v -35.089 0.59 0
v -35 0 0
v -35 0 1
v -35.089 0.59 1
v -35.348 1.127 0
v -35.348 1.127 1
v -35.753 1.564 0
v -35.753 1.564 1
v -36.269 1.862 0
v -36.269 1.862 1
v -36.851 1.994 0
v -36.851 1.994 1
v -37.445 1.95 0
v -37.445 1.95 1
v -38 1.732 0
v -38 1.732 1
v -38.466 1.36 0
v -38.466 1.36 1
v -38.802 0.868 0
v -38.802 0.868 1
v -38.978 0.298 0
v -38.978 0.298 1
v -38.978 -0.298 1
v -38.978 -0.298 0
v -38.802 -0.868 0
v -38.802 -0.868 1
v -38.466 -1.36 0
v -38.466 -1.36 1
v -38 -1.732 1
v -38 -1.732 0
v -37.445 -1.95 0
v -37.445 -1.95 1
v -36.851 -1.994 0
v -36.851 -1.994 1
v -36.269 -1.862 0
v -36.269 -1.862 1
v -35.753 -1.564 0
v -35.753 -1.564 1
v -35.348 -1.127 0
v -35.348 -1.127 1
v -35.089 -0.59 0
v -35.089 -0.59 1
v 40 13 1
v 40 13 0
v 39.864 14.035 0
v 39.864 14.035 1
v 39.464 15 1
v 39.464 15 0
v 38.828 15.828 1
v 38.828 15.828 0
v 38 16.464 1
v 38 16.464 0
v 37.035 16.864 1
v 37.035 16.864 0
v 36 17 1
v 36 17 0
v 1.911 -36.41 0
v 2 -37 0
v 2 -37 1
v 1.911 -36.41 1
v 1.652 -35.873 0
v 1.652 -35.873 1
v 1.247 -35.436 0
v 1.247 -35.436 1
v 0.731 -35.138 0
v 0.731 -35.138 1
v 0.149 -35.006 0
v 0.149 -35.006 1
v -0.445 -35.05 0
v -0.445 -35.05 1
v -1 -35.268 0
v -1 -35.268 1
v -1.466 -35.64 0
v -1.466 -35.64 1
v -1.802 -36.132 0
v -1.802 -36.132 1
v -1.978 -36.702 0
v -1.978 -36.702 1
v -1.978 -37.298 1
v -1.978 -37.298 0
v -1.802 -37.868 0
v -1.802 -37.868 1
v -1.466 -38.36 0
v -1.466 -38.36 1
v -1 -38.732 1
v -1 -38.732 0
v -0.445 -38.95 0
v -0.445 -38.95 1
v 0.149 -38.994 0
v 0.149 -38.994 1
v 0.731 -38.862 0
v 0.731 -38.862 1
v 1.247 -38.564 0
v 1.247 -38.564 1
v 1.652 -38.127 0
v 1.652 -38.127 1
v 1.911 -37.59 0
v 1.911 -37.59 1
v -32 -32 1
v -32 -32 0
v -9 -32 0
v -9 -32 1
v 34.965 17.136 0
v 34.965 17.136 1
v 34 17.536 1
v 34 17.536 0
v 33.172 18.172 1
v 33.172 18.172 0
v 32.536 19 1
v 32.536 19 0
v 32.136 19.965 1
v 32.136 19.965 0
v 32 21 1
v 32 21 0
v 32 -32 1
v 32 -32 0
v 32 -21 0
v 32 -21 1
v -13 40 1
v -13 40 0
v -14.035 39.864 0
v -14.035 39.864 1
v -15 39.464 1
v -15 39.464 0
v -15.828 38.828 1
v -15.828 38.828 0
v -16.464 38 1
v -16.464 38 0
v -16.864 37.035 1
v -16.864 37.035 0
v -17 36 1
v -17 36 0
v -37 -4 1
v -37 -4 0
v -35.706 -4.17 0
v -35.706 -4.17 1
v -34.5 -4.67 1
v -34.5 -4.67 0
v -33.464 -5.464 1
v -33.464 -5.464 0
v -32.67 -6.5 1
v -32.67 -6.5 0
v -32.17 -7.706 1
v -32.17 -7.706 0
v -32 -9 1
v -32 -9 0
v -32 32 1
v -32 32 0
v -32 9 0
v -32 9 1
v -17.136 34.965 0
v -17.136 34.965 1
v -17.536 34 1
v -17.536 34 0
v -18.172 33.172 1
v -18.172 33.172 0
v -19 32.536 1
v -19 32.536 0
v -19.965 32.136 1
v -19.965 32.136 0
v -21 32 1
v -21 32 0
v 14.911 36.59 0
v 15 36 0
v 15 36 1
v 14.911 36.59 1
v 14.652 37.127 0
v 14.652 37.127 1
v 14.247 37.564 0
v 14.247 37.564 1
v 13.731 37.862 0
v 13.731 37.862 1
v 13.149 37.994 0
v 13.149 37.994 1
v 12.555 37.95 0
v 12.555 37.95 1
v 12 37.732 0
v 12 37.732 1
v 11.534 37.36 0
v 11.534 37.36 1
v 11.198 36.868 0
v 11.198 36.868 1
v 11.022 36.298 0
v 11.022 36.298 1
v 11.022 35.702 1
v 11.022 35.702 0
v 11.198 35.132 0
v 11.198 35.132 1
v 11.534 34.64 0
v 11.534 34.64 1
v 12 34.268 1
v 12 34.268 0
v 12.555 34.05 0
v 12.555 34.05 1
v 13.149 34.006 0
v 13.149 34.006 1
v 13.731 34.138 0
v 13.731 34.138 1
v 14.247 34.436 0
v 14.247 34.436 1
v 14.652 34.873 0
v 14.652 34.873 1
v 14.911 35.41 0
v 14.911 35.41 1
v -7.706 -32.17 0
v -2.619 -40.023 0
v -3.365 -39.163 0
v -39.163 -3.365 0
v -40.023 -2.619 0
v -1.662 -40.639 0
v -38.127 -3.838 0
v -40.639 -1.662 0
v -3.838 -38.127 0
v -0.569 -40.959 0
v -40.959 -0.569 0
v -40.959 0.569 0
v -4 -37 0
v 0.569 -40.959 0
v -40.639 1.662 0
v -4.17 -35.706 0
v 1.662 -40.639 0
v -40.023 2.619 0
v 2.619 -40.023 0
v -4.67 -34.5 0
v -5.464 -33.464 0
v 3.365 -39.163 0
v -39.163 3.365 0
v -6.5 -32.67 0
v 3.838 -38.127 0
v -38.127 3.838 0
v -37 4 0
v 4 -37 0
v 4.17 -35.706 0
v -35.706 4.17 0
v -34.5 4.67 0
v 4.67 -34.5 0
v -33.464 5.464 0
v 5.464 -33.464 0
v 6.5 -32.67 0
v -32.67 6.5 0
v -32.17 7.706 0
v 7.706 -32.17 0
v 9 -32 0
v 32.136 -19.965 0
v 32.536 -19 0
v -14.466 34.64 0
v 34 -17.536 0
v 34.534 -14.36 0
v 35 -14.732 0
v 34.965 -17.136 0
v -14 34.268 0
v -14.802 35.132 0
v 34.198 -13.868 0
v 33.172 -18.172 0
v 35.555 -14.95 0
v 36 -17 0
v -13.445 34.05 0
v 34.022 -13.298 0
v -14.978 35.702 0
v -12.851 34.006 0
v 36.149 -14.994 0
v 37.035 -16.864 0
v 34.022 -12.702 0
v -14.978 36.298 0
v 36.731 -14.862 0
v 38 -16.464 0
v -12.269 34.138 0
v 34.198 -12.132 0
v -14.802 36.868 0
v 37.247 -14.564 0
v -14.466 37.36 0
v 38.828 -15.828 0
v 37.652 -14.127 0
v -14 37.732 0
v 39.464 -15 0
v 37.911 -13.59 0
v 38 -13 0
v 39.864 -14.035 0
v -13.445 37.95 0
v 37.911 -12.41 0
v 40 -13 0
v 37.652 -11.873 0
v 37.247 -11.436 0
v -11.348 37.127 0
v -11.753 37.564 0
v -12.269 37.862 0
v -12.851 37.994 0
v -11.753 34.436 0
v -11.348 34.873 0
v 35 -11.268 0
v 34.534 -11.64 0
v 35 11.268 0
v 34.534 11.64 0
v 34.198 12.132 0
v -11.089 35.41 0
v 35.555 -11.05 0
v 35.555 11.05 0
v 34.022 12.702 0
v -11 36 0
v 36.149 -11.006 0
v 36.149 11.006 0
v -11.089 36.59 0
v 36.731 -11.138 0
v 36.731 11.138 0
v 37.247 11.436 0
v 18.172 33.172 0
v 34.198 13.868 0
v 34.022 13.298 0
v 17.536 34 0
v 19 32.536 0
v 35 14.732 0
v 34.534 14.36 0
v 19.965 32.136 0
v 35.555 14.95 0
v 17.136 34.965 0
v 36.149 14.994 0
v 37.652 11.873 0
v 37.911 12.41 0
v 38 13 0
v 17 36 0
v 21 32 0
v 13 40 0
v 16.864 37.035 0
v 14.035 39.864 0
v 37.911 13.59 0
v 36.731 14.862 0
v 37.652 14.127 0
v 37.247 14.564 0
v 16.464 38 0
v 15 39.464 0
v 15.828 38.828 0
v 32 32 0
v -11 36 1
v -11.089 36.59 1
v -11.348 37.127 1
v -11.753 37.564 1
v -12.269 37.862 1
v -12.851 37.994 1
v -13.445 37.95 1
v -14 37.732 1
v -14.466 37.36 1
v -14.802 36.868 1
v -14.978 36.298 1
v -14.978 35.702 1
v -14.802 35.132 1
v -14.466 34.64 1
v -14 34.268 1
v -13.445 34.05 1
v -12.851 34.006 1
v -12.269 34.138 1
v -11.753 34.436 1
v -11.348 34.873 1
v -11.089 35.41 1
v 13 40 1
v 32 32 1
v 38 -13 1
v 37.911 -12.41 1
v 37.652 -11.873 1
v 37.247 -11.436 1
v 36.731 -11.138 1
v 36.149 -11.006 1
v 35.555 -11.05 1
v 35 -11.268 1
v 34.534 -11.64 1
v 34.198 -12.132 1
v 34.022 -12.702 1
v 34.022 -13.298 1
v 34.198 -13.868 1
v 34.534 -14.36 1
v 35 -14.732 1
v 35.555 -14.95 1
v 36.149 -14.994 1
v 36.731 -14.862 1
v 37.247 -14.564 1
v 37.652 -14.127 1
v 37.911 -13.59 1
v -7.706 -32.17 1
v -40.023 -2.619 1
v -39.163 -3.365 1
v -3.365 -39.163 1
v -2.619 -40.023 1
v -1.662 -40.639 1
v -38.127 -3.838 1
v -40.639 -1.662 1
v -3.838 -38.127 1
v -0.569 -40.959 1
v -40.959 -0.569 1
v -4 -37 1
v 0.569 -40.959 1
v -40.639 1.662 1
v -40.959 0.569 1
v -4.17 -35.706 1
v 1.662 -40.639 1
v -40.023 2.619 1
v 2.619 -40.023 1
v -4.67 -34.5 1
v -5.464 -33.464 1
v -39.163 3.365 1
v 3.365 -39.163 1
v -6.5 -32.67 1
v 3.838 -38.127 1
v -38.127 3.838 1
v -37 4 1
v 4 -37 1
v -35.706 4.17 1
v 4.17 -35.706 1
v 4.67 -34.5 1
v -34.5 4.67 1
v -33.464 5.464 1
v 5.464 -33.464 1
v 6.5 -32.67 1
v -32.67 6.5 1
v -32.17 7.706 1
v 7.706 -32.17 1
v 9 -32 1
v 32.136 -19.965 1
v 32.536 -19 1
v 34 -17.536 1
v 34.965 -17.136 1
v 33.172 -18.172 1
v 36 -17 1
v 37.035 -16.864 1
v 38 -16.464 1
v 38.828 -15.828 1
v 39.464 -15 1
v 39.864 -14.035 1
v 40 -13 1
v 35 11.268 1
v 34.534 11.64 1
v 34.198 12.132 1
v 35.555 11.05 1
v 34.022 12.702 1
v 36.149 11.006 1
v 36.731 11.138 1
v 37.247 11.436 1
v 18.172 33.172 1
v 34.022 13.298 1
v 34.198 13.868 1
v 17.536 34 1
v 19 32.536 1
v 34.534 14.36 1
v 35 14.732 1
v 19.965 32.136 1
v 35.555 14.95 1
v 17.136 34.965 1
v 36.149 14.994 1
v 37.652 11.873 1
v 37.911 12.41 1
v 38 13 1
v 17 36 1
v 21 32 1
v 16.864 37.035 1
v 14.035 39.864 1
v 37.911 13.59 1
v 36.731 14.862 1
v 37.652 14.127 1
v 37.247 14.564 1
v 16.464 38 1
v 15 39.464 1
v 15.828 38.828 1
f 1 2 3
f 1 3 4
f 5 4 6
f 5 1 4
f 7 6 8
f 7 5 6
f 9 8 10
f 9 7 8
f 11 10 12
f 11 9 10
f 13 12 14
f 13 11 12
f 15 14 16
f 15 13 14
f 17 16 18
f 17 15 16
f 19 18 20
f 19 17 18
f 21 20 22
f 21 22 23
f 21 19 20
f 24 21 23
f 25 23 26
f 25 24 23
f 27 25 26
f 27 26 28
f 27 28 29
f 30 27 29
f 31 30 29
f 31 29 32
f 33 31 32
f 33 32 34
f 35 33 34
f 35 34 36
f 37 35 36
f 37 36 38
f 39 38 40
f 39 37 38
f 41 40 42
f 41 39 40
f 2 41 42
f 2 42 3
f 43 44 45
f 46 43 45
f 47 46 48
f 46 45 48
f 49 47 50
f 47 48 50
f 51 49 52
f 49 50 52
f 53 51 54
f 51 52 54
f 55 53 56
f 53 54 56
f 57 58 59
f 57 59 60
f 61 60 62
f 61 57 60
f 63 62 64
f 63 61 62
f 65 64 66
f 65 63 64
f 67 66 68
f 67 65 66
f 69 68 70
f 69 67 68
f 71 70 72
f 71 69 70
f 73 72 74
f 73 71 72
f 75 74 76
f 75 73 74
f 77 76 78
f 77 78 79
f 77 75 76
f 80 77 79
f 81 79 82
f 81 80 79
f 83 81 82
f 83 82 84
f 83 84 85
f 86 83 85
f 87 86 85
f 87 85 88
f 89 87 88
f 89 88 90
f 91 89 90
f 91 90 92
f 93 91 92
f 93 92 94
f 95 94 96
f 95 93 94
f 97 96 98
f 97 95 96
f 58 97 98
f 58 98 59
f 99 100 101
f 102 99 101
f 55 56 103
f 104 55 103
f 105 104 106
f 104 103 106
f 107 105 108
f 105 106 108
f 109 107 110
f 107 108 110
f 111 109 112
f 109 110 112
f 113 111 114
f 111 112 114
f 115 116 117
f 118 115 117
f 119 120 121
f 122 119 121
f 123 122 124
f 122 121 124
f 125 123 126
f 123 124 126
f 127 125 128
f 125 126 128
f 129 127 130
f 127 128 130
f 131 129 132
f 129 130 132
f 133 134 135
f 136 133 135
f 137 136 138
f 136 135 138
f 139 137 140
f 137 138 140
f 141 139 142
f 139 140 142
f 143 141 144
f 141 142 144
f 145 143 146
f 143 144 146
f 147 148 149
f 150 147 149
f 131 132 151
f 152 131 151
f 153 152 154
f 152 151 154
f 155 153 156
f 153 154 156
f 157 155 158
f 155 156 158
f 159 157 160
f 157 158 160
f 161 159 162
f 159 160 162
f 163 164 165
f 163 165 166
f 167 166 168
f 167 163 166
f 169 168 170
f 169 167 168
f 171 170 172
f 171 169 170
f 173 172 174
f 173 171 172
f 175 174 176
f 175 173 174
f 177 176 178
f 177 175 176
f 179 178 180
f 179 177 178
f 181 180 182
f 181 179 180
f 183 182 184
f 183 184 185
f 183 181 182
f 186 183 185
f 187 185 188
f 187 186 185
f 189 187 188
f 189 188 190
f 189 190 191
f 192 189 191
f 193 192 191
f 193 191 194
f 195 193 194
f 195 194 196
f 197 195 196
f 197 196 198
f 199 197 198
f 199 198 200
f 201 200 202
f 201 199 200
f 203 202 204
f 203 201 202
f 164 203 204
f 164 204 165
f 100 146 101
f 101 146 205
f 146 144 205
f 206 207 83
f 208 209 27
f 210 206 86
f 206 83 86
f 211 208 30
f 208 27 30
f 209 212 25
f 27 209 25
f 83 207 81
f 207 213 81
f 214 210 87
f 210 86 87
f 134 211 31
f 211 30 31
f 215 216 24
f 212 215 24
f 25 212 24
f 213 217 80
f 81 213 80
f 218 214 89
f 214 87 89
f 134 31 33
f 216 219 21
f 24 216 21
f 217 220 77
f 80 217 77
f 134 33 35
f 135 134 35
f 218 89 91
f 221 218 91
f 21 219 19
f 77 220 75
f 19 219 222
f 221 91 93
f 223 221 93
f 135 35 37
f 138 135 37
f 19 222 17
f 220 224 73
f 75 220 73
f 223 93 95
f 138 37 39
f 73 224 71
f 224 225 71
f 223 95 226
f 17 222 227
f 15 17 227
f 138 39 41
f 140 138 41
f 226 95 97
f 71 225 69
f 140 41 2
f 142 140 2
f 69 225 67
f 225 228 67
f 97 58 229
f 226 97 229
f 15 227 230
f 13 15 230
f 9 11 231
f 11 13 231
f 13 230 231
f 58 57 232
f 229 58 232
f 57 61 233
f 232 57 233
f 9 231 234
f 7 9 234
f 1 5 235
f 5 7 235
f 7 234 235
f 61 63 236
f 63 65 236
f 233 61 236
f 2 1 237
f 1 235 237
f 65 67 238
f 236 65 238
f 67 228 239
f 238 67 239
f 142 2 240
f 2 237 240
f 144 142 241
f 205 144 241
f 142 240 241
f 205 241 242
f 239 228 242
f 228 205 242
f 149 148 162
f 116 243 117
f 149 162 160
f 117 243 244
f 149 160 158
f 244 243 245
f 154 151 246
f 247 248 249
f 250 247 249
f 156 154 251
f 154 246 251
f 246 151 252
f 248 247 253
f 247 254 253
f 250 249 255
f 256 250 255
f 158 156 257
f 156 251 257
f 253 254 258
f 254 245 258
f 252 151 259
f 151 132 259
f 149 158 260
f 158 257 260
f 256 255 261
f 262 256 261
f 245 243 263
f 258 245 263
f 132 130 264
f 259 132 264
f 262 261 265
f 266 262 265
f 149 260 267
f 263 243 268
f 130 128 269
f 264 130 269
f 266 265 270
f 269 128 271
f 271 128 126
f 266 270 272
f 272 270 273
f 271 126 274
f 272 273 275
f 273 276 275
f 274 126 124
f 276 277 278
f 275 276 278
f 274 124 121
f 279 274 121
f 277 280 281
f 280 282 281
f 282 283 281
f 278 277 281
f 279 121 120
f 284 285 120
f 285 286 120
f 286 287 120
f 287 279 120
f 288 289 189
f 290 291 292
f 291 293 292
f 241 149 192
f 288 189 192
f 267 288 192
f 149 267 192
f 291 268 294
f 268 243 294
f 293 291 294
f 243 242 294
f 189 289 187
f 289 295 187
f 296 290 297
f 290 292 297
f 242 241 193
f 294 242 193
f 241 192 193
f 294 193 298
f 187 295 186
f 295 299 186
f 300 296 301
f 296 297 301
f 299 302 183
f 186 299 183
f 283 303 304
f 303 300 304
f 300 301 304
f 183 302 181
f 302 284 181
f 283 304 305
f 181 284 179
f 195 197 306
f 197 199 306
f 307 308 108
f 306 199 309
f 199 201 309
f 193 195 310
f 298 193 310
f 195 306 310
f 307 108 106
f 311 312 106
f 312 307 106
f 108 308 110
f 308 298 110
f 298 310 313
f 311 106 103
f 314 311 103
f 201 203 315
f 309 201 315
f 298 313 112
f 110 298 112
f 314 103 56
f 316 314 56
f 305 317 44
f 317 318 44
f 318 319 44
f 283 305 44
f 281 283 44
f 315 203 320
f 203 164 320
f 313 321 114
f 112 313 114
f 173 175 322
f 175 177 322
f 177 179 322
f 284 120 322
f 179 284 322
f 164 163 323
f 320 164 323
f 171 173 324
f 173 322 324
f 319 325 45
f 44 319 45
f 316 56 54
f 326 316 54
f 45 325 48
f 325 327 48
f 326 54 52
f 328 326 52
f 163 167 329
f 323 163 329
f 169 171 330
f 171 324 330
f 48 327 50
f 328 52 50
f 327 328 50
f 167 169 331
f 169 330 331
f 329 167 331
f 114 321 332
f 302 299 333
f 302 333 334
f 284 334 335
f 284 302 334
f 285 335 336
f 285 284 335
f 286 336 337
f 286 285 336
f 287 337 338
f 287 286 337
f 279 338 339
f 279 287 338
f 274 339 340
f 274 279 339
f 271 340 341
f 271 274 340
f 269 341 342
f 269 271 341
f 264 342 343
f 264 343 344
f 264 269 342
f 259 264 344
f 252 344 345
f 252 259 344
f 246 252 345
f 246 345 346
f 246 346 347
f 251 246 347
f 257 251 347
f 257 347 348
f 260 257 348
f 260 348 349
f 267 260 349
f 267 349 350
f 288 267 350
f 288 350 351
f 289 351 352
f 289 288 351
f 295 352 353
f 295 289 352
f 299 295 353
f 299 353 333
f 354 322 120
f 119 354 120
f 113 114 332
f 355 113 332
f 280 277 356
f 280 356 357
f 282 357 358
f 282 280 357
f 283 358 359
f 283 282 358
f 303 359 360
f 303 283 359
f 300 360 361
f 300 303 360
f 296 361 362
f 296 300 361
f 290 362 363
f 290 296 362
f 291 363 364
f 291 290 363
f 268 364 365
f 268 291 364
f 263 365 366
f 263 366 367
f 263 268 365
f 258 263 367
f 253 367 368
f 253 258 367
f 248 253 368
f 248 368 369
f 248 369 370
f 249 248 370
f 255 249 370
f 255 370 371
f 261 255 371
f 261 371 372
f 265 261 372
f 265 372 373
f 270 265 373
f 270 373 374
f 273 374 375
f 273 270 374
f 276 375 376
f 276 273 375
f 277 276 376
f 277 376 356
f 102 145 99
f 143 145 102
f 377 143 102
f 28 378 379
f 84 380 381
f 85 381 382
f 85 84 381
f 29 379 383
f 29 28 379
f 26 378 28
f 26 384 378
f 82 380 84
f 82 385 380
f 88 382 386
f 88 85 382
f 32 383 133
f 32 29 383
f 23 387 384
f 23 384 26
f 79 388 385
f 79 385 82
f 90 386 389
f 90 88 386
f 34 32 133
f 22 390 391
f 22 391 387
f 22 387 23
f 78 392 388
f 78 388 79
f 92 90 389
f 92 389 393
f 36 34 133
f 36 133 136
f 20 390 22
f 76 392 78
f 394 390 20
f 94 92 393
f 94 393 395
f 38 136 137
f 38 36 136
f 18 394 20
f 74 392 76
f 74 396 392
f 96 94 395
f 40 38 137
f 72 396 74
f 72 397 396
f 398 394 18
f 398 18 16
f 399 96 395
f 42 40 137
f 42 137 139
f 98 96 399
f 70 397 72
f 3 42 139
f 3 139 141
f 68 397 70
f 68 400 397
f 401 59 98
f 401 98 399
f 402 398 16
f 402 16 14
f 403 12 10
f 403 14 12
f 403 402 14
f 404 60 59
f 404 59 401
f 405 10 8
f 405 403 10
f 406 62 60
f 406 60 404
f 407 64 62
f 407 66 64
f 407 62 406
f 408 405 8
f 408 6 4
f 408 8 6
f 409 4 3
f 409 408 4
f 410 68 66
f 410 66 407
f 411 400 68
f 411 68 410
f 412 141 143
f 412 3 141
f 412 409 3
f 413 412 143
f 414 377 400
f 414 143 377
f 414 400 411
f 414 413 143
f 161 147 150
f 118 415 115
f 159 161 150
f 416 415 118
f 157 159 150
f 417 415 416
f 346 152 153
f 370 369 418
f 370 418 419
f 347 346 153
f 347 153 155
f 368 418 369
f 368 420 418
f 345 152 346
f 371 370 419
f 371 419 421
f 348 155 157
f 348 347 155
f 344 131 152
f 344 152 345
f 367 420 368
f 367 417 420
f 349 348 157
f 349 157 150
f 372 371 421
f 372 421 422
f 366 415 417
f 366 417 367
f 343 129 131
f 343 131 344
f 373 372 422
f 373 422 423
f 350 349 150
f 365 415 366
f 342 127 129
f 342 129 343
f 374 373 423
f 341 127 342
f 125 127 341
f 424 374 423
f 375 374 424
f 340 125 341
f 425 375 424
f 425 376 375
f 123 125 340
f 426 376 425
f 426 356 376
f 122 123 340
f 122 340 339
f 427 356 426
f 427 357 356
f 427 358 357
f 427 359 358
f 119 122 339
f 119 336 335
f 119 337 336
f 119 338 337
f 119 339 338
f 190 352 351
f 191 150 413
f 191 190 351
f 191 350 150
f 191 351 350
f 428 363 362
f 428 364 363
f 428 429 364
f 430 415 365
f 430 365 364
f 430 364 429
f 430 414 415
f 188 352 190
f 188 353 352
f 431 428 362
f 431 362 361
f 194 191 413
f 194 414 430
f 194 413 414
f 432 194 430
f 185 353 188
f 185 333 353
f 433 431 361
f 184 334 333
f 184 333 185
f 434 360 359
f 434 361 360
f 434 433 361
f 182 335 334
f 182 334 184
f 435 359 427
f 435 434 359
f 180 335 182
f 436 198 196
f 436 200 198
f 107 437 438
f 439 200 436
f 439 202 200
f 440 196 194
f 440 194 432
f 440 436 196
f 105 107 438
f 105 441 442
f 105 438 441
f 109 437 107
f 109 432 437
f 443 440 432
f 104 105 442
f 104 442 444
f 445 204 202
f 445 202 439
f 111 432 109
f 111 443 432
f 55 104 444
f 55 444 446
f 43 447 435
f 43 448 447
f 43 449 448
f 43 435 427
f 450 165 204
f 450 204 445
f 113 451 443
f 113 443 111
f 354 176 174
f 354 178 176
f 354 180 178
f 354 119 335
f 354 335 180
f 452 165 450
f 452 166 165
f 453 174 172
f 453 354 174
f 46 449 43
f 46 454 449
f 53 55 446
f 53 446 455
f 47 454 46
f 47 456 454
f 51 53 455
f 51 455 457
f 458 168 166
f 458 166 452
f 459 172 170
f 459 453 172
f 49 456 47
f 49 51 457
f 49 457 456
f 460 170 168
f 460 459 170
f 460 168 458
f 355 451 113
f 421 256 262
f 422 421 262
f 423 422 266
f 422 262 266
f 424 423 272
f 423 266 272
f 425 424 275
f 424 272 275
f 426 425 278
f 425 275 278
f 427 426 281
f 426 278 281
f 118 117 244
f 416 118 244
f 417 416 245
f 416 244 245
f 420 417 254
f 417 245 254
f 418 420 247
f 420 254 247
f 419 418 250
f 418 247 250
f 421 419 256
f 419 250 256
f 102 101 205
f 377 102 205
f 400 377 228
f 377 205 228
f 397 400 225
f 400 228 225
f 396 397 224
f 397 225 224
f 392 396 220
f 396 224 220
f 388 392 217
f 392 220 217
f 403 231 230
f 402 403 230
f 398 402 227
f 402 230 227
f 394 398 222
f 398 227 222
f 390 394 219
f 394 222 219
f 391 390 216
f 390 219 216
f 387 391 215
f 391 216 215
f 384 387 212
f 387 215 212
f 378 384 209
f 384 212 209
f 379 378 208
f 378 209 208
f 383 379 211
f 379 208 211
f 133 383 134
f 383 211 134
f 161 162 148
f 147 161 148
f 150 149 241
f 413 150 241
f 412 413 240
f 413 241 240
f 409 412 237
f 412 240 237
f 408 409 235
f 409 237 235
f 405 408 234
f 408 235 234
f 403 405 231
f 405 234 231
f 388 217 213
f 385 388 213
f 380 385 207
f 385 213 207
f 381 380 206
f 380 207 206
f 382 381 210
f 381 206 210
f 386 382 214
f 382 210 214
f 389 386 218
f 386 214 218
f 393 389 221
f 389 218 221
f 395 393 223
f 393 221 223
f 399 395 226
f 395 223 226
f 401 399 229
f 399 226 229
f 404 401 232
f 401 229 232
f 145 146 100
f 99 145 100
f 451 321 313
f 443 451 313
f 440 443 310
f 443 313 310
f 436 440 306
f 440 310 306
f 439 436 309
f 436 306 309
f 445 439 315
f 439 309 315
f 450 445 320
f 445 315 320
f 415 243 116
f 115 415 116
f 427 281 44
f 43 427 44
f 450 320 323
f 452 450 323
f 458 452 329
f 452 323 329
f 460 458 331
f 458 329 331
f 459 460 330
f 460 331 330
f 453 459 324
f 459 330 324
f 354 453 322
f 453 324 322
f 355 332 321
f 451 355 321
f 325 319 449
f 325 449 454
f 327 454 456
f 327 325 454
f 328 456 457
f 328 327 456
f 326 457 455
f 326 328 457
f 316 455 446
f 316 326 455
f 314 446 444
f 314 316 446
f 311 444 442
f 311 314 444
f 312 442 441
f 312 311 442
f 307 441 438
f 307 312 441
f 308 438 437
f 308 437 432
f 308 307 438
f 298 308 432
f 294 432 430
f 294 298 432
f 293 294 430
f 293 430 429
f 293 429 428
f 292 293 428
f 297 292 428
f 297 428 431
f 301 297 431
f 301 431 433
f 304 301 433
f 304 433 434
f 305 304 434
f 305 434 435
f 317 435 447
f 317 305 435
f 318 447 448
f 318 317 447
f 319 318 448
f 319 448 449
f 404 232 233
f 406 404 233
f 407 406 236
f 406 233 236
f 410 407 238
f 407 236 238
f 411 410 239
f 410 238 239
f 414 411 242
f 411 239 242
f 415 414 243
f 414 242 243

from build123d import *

# Parameters (mm, degrees)
SKETCH1_R           = 2
SKETCH1_W           = 56
SKETCH1_H           = 56
BOSS_EXTRUDE1_DEPTH = 1
SKETCH3_W           = 56
SKETCH3_H           = 56
BOSS_EXTRUDE3_DEPTH = 1


with BuildPart() as part:
    # Sketch1 → Boss-Extrude1 (new body)
    with BuildSketch(Plane.XY):
        with BuildLine():
            Line((40, -13), (40, 13))
            ThreePointArc((40, 13), (38.828427125, 15.828427125), (36, 17))
            ThreePointArc((36, 17), (33.171572875, 18.171572875), (32, 21))
            Line((32, 21), (32, 32))
            Line((32, 32), (21, 32))
            ThreePointArc((21, 32), (18.171572875, 33.171572875), (17, 36))
            ThreePointArc((17, 36), (15.828427125, 38.828427125), (13, 40))
            Line((13, 40), (-13, 40))
            ThreePointArc((-13, 40), (-15.828427125, 38.828427125), (-17, 36))
            ThreePointArc((-17, 36), (-18.171572875, 33.171572875), (-21, 32))
            Line((-21, 32), (-32, 32))
            Line((-32, 32), (-32, 9))
            ThreePointArc((-32, 9), (-33.464466094, 5.464466094), (-37, 4))
            ThreePointArc((-37, 4), (-41, 0), (-37, -4))
            ThreePointArc((-37, -4), (-33.464466094, -5.464466094), (-32, -9))
            Line((-32, -9), (-32, -32))
            Line((-32, -32), (-9, -32))
            ThreePointArc((-9, -32), (-5.464466094, -33.464466094), (-4, -37))
            ThreePointArc((-4, -37), (0, -41), (4, -37))
            ThreePointArc((4, -37), (5.464466094, -33.464466094), (9, -32))
            Line((9, -32), (32, -32))
            Line((32, -32), (32, -21))
            ThreePointArc((32, -21), (33.171572875, -18.171572875), (36, -17))
            ThreePointArc((36, -17), (38.828427125, -15.828427125), (40, -13))
        make_face()
        with Locations((-37, 0)):
            Circle(SKETCH1_R, mode=Mode.SUBTRACT)
        with Locations((-13, 36)):
            Circle(SKETCH1_R, mode=Mode.SUBTRACT)
        with Locations((0, -37)):
            Circle(SKETCH1_R, mode=Mode.SUBTRACT)
        with Locations((36, -13)):
            Circle(SKETCH1_R, mode=Mode.SUBTRACT)
        with Locations((36, 13)):
            Circle(SKETCH1_R, mode=Mode.SUBTRACT)
        with Locations((13, 36)):
            Circle(SKETCH1_R, mode=Mode.SUBTRACT)
        Rectangle(SKETCH1_W, SKETCH1_H, mode=Mode.SUBTRACT)
    extrude(amount=BOSS_EXTRUDE1_DEPTH)

    # Sketch3 → Boss-Extrude3 (add)
    with BuildSketch(Plane.XY.offset(1)):
        Rectangle(SKETCH3_W, SKETCH3_H)
    extrude(amount=-BOSS_EXTRUDE3_DEPTH)


solid = part.part
